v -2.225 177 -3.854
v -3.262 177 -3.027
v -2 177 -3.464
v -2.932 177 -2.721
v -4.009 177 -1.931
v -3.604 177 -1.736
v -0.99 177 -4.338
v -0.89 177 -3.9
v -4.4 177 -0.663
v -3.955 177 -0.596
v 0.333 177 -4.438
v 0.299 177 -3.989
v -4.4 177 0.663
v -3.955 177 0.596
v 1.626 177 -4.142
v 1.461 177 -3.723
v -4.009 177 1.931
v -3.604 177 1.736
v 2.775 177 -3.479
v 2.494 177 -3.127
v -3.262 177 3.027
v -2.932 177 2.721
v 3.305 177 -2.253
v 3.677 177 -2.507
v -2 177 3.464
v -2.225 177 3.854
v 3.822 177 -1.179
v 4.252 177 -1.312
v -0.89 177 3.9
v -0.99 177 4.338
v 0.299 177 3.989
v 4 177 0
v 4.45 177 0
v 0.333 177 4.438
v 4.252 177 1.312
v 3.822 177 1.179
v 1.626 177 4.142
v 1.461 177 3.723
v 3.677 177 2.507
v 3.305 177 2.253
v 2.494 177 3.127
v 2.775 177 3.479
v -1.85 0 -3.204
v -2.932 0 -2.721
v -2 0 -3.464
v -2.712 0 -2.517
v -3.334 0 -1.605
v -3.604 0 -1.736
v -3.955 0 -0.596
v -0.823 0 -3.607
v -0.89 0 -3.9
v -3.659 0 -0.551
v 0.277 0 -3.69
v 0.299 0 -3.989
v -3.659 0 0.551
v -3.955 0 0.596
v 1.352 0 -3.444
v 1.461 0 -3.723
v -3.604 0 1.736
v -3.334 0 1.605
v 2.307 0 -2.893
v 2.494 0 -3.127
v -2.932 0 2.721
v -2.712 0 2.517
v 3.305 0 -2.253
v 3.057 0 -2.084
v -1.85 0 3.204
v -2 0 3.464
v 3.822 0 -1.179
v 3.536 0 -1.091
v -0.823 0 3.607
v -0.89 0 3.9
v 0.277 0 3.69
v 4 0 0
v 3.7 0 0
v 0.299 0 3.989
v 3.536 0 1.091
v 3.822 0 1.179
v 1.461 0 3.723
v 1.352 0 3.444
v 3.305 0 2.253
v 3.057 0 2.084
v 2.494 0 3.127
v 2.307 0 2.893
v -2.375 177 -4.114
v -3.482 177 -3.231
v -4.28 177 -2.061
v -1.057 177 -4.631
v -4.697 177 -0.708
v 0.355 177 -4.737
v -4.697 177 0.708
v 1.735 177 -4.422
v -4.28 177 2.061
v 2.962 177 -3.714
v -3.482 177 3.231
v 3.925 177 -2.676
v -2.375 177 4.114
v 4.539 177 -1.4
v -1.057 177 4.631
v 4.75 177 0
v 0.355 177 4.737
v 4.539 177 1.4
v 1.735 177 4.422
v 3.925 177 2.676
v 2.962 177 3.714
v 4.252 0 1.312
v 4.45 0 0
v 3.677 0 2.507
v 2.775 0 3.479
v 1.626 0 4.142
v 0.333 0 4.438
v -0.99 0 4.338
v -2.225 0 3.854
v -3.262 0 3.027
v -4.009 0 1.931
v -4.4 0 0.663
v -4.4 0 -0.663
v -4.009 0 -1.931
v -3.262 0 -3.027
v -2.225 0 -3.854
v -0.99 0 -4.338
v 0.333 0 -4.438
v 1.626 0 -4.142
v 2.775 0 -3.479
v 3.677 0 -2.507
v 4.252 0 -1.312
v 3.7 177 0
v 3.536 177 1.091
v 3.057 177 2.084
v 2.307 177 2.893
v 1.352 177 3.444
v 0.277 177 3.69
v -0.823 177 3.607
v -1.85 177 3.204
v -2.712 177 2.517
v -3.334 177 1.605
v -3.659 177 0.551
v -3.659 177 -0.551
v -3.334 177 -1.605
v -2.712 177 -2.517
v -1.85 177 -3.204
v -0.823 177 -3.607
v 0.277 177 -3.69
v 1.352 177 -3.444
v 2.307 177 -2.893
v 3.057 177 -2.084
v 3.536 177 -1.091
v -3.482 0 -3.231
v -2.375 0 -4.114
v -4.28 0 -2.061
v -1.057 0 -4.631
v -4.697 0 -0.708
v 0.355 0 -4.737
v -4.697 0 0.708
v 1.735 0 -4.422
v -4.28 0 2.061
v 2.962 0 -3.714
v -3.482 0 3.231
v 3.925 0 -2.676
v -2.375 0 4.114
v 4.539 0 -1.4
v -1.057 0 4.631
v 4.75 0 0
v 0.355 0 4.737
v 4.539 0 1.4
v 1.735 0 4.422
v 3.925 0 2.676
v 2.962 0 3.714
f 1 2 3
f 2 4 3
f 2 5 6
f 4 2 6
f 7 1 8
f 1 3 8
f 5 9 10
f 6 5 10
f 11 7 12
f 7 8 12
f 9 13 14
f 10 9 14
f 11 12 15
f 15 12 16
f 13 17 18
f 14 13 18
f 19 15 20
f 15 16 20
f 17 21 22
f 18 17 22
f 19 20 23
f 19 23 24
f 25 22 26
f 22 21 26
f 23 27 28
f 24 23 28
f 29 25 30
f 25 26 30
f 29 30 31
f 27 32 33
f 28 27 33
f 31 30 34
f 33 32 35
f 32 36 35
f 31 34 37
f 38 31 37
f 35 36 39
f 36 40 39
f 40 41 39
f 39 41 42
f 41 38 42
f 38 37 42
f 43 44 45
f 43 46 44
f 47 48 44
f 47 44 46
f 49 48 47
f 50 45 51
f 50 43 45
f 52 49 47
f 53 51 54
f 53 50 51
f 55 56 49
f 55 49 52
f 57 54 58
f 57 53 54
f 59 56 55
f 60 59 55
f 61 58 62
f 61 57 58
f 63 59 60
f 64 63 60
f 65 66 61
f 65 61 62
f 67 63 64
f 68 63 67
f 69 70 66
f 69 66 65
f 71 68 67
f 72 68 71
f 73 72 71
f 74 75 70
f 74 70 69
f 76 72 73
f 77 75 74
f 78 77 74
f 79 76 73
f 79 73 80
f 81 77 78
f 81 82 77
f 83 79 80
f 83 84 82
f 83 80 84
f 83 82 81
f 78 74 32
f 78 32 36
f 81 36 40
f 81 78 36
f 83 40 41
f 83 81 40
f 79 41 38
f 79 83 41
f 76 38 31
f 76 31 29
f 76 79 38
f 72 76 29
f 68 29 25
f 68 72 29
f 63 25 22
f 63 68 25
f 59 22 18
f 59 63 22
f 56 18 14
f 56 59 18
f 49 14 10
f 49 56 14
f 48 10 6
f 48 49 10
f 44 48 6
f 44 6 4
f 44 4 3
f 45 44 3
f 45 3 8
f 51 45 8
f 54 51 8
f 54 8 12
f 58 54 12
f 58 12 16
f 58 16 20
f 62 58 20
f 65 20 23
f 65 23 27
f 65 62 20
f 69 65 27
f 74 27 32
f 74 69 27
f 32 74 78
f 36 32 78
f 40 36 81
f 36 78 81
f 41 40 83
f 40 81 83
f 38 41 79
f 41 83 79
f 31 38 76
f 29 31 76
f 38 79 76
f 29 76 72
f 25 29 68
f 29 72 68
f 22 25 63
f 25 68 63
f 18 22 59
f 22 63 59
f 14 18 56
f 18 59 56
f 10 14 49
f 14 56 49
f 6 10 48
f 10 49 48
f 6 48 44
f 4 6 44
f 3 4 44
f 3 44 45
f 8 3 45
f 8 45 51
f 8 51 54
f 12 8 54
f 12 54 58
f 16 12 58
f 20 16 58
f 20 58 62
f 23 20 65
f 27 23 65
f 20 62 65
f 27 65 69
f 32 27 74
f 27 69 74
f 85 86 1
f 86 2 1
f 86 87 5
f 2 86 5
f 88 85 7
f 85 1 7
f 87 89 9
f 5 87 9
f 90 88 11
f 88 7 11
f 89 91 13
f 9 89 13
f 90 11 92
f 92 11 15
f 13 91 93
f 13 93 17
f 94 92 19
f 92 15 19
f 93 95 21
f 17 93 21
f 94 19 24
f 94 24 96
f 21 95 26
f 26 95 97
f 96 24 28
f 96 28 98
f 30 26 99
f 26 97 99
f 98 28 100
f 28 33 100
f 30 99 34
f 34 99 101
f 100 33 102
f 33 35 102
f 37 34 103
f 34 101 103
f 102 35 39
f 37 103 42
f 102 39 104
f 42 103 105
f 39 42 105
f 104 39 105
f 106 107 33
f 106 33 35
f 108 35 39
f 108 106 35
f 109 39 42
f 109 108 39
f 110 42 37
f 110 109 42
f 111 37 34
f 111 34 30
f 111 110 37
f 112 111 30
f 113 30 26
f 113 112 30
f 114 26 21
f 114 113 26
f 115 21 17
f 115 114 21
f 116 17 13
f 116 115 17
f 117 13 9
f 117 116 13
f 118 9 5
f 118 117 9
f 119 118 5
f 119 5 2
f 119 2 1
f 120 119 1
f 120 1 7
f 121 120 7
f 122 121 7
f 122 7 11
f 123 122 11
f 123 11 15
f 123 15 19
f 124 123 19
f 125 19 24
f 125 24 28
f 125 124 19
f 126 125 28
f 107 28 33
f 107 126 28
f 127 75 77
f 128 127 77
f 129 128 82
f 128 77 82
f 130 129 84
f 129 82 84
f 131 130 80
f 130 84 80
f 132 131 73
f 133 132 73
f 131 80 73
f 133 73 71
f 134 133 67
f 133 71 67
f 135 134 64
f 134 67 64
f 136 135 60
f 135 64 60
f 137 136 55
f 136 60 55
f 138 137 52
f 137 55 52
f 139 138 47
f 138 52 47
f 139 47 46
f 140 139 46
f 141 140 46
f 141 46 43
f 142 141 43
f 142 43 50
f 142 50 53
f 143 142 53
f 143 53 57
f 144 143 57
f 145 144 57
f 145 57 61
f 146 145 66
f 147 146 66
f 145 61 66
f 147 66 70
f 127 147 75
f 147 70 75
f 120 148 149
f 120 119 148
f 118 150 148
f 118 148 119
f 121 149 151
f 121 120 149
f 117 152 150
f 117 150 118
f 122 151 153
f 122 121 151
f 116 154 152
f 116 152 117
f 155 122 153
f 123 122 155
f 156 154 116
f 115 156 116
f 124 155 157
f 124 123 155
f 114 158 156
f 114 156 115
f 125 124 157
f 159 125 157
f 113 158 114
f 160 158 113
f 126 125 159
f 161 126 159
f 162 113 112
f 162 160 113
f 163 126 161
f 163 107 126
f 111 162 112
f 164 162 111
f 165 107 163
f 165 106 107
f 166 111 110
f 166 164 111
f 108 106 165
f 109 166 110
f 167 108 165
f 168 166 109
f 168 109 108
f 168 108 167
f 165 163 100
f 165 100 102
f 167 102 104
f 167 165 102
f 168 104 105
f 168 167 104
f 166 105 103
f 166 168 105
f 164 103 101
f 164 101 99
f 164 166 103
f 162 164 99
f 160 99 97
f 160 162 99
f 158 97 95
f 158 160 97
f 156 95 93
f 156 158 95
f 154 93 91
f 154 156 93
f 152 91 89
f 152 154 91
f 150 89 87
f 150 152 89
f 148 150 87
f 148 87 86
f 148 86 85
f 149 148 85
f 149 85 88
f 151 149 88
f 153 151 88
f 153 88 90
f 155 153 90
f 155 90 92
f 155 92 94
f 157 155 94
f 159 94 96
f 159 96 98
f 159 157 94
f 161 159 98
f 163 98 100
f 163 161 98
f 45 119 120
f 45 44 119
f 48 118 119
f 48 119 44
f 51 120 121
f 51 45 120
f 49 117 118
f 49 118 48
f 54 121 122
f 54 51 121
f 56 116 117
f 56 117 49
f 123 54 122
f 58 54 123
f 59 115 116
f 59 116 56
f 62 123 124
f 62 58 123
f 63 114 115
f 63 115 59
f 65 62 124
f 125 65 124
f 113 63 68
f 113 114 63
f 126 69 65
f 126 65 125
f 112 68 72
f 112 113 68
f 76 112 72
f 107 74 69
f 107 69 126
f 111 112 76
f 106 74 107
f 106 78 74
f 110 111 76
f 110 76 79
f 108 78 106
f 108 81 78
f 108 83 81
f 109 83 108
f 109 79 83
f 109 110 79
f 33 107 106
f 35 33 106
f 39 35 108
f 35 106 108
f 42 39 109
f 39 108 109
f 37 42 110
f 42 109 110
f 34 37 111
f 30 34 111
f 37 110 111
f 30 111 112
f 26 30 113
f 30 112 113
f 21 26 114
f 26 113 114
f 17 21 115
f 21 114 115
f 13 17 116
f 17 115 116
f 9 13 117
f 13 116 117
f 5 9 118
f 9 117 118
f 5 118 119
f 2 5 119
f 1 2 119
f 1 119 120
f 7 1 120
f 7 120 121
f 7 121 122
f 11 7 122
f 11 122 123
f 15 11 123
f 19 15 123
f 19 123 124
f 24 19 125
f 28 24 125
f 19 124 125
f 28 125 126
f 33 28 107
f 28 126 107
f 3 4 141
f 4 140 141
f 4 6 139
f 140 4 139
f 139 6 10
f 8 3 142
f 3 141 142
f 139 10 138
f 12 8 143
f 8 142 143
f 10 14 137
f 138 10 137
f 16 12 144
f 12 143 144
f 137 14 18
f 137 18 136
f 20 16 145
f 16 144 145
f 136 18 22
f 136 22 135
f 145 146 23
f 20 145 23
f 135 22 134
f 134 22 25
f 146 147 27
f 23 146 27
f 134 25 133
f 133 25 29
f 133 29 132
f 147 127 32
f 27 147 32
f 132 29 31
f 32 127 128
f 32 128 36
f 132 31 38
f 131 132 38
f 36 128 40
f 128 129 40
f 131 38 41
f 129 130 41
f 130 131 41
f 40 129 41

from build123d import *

# Parameters (mm, degrees)
F0_R     = 4.75
F0_R_2   = 4.45
F1_DEPTH = 177
F0_R_3   = 4
F0_R_4   = 3.7
F2_DEPTH = 177
F3_DEPTH = 177


with BuildPart() as f1:
    # F0 (on Front) → F1 (new body)
    with BuildSketch(Plane.XZ):
        Circle(F0_R)
        Circle(F0_R_2, mode=Mode.SUBTRACT)
    extrude(amount=-F1_DEPTH)


with BuildPart() as f2:
    # F0 (on Front) → F2 (new body)
    with BuildSketch(Plane.XZ):
        Circle(F0_R_3)
        Circle(F0_R_4, mode=Mode.SUBTRACT)
    extrude(amount=-F2_DEPTH)


with BuildPart() as f3:
    # F0 (on Front) → F3 (new body)
    with BuildSketch(Plane.XZ):
        Circle(F0_R_2)
        Circle(F0_R_3, mode=Mode.SUBTRACT)
    extrude(amount=-F3_DEPTH)


solid = Compound([f1.part, f2.part, f3.part])
